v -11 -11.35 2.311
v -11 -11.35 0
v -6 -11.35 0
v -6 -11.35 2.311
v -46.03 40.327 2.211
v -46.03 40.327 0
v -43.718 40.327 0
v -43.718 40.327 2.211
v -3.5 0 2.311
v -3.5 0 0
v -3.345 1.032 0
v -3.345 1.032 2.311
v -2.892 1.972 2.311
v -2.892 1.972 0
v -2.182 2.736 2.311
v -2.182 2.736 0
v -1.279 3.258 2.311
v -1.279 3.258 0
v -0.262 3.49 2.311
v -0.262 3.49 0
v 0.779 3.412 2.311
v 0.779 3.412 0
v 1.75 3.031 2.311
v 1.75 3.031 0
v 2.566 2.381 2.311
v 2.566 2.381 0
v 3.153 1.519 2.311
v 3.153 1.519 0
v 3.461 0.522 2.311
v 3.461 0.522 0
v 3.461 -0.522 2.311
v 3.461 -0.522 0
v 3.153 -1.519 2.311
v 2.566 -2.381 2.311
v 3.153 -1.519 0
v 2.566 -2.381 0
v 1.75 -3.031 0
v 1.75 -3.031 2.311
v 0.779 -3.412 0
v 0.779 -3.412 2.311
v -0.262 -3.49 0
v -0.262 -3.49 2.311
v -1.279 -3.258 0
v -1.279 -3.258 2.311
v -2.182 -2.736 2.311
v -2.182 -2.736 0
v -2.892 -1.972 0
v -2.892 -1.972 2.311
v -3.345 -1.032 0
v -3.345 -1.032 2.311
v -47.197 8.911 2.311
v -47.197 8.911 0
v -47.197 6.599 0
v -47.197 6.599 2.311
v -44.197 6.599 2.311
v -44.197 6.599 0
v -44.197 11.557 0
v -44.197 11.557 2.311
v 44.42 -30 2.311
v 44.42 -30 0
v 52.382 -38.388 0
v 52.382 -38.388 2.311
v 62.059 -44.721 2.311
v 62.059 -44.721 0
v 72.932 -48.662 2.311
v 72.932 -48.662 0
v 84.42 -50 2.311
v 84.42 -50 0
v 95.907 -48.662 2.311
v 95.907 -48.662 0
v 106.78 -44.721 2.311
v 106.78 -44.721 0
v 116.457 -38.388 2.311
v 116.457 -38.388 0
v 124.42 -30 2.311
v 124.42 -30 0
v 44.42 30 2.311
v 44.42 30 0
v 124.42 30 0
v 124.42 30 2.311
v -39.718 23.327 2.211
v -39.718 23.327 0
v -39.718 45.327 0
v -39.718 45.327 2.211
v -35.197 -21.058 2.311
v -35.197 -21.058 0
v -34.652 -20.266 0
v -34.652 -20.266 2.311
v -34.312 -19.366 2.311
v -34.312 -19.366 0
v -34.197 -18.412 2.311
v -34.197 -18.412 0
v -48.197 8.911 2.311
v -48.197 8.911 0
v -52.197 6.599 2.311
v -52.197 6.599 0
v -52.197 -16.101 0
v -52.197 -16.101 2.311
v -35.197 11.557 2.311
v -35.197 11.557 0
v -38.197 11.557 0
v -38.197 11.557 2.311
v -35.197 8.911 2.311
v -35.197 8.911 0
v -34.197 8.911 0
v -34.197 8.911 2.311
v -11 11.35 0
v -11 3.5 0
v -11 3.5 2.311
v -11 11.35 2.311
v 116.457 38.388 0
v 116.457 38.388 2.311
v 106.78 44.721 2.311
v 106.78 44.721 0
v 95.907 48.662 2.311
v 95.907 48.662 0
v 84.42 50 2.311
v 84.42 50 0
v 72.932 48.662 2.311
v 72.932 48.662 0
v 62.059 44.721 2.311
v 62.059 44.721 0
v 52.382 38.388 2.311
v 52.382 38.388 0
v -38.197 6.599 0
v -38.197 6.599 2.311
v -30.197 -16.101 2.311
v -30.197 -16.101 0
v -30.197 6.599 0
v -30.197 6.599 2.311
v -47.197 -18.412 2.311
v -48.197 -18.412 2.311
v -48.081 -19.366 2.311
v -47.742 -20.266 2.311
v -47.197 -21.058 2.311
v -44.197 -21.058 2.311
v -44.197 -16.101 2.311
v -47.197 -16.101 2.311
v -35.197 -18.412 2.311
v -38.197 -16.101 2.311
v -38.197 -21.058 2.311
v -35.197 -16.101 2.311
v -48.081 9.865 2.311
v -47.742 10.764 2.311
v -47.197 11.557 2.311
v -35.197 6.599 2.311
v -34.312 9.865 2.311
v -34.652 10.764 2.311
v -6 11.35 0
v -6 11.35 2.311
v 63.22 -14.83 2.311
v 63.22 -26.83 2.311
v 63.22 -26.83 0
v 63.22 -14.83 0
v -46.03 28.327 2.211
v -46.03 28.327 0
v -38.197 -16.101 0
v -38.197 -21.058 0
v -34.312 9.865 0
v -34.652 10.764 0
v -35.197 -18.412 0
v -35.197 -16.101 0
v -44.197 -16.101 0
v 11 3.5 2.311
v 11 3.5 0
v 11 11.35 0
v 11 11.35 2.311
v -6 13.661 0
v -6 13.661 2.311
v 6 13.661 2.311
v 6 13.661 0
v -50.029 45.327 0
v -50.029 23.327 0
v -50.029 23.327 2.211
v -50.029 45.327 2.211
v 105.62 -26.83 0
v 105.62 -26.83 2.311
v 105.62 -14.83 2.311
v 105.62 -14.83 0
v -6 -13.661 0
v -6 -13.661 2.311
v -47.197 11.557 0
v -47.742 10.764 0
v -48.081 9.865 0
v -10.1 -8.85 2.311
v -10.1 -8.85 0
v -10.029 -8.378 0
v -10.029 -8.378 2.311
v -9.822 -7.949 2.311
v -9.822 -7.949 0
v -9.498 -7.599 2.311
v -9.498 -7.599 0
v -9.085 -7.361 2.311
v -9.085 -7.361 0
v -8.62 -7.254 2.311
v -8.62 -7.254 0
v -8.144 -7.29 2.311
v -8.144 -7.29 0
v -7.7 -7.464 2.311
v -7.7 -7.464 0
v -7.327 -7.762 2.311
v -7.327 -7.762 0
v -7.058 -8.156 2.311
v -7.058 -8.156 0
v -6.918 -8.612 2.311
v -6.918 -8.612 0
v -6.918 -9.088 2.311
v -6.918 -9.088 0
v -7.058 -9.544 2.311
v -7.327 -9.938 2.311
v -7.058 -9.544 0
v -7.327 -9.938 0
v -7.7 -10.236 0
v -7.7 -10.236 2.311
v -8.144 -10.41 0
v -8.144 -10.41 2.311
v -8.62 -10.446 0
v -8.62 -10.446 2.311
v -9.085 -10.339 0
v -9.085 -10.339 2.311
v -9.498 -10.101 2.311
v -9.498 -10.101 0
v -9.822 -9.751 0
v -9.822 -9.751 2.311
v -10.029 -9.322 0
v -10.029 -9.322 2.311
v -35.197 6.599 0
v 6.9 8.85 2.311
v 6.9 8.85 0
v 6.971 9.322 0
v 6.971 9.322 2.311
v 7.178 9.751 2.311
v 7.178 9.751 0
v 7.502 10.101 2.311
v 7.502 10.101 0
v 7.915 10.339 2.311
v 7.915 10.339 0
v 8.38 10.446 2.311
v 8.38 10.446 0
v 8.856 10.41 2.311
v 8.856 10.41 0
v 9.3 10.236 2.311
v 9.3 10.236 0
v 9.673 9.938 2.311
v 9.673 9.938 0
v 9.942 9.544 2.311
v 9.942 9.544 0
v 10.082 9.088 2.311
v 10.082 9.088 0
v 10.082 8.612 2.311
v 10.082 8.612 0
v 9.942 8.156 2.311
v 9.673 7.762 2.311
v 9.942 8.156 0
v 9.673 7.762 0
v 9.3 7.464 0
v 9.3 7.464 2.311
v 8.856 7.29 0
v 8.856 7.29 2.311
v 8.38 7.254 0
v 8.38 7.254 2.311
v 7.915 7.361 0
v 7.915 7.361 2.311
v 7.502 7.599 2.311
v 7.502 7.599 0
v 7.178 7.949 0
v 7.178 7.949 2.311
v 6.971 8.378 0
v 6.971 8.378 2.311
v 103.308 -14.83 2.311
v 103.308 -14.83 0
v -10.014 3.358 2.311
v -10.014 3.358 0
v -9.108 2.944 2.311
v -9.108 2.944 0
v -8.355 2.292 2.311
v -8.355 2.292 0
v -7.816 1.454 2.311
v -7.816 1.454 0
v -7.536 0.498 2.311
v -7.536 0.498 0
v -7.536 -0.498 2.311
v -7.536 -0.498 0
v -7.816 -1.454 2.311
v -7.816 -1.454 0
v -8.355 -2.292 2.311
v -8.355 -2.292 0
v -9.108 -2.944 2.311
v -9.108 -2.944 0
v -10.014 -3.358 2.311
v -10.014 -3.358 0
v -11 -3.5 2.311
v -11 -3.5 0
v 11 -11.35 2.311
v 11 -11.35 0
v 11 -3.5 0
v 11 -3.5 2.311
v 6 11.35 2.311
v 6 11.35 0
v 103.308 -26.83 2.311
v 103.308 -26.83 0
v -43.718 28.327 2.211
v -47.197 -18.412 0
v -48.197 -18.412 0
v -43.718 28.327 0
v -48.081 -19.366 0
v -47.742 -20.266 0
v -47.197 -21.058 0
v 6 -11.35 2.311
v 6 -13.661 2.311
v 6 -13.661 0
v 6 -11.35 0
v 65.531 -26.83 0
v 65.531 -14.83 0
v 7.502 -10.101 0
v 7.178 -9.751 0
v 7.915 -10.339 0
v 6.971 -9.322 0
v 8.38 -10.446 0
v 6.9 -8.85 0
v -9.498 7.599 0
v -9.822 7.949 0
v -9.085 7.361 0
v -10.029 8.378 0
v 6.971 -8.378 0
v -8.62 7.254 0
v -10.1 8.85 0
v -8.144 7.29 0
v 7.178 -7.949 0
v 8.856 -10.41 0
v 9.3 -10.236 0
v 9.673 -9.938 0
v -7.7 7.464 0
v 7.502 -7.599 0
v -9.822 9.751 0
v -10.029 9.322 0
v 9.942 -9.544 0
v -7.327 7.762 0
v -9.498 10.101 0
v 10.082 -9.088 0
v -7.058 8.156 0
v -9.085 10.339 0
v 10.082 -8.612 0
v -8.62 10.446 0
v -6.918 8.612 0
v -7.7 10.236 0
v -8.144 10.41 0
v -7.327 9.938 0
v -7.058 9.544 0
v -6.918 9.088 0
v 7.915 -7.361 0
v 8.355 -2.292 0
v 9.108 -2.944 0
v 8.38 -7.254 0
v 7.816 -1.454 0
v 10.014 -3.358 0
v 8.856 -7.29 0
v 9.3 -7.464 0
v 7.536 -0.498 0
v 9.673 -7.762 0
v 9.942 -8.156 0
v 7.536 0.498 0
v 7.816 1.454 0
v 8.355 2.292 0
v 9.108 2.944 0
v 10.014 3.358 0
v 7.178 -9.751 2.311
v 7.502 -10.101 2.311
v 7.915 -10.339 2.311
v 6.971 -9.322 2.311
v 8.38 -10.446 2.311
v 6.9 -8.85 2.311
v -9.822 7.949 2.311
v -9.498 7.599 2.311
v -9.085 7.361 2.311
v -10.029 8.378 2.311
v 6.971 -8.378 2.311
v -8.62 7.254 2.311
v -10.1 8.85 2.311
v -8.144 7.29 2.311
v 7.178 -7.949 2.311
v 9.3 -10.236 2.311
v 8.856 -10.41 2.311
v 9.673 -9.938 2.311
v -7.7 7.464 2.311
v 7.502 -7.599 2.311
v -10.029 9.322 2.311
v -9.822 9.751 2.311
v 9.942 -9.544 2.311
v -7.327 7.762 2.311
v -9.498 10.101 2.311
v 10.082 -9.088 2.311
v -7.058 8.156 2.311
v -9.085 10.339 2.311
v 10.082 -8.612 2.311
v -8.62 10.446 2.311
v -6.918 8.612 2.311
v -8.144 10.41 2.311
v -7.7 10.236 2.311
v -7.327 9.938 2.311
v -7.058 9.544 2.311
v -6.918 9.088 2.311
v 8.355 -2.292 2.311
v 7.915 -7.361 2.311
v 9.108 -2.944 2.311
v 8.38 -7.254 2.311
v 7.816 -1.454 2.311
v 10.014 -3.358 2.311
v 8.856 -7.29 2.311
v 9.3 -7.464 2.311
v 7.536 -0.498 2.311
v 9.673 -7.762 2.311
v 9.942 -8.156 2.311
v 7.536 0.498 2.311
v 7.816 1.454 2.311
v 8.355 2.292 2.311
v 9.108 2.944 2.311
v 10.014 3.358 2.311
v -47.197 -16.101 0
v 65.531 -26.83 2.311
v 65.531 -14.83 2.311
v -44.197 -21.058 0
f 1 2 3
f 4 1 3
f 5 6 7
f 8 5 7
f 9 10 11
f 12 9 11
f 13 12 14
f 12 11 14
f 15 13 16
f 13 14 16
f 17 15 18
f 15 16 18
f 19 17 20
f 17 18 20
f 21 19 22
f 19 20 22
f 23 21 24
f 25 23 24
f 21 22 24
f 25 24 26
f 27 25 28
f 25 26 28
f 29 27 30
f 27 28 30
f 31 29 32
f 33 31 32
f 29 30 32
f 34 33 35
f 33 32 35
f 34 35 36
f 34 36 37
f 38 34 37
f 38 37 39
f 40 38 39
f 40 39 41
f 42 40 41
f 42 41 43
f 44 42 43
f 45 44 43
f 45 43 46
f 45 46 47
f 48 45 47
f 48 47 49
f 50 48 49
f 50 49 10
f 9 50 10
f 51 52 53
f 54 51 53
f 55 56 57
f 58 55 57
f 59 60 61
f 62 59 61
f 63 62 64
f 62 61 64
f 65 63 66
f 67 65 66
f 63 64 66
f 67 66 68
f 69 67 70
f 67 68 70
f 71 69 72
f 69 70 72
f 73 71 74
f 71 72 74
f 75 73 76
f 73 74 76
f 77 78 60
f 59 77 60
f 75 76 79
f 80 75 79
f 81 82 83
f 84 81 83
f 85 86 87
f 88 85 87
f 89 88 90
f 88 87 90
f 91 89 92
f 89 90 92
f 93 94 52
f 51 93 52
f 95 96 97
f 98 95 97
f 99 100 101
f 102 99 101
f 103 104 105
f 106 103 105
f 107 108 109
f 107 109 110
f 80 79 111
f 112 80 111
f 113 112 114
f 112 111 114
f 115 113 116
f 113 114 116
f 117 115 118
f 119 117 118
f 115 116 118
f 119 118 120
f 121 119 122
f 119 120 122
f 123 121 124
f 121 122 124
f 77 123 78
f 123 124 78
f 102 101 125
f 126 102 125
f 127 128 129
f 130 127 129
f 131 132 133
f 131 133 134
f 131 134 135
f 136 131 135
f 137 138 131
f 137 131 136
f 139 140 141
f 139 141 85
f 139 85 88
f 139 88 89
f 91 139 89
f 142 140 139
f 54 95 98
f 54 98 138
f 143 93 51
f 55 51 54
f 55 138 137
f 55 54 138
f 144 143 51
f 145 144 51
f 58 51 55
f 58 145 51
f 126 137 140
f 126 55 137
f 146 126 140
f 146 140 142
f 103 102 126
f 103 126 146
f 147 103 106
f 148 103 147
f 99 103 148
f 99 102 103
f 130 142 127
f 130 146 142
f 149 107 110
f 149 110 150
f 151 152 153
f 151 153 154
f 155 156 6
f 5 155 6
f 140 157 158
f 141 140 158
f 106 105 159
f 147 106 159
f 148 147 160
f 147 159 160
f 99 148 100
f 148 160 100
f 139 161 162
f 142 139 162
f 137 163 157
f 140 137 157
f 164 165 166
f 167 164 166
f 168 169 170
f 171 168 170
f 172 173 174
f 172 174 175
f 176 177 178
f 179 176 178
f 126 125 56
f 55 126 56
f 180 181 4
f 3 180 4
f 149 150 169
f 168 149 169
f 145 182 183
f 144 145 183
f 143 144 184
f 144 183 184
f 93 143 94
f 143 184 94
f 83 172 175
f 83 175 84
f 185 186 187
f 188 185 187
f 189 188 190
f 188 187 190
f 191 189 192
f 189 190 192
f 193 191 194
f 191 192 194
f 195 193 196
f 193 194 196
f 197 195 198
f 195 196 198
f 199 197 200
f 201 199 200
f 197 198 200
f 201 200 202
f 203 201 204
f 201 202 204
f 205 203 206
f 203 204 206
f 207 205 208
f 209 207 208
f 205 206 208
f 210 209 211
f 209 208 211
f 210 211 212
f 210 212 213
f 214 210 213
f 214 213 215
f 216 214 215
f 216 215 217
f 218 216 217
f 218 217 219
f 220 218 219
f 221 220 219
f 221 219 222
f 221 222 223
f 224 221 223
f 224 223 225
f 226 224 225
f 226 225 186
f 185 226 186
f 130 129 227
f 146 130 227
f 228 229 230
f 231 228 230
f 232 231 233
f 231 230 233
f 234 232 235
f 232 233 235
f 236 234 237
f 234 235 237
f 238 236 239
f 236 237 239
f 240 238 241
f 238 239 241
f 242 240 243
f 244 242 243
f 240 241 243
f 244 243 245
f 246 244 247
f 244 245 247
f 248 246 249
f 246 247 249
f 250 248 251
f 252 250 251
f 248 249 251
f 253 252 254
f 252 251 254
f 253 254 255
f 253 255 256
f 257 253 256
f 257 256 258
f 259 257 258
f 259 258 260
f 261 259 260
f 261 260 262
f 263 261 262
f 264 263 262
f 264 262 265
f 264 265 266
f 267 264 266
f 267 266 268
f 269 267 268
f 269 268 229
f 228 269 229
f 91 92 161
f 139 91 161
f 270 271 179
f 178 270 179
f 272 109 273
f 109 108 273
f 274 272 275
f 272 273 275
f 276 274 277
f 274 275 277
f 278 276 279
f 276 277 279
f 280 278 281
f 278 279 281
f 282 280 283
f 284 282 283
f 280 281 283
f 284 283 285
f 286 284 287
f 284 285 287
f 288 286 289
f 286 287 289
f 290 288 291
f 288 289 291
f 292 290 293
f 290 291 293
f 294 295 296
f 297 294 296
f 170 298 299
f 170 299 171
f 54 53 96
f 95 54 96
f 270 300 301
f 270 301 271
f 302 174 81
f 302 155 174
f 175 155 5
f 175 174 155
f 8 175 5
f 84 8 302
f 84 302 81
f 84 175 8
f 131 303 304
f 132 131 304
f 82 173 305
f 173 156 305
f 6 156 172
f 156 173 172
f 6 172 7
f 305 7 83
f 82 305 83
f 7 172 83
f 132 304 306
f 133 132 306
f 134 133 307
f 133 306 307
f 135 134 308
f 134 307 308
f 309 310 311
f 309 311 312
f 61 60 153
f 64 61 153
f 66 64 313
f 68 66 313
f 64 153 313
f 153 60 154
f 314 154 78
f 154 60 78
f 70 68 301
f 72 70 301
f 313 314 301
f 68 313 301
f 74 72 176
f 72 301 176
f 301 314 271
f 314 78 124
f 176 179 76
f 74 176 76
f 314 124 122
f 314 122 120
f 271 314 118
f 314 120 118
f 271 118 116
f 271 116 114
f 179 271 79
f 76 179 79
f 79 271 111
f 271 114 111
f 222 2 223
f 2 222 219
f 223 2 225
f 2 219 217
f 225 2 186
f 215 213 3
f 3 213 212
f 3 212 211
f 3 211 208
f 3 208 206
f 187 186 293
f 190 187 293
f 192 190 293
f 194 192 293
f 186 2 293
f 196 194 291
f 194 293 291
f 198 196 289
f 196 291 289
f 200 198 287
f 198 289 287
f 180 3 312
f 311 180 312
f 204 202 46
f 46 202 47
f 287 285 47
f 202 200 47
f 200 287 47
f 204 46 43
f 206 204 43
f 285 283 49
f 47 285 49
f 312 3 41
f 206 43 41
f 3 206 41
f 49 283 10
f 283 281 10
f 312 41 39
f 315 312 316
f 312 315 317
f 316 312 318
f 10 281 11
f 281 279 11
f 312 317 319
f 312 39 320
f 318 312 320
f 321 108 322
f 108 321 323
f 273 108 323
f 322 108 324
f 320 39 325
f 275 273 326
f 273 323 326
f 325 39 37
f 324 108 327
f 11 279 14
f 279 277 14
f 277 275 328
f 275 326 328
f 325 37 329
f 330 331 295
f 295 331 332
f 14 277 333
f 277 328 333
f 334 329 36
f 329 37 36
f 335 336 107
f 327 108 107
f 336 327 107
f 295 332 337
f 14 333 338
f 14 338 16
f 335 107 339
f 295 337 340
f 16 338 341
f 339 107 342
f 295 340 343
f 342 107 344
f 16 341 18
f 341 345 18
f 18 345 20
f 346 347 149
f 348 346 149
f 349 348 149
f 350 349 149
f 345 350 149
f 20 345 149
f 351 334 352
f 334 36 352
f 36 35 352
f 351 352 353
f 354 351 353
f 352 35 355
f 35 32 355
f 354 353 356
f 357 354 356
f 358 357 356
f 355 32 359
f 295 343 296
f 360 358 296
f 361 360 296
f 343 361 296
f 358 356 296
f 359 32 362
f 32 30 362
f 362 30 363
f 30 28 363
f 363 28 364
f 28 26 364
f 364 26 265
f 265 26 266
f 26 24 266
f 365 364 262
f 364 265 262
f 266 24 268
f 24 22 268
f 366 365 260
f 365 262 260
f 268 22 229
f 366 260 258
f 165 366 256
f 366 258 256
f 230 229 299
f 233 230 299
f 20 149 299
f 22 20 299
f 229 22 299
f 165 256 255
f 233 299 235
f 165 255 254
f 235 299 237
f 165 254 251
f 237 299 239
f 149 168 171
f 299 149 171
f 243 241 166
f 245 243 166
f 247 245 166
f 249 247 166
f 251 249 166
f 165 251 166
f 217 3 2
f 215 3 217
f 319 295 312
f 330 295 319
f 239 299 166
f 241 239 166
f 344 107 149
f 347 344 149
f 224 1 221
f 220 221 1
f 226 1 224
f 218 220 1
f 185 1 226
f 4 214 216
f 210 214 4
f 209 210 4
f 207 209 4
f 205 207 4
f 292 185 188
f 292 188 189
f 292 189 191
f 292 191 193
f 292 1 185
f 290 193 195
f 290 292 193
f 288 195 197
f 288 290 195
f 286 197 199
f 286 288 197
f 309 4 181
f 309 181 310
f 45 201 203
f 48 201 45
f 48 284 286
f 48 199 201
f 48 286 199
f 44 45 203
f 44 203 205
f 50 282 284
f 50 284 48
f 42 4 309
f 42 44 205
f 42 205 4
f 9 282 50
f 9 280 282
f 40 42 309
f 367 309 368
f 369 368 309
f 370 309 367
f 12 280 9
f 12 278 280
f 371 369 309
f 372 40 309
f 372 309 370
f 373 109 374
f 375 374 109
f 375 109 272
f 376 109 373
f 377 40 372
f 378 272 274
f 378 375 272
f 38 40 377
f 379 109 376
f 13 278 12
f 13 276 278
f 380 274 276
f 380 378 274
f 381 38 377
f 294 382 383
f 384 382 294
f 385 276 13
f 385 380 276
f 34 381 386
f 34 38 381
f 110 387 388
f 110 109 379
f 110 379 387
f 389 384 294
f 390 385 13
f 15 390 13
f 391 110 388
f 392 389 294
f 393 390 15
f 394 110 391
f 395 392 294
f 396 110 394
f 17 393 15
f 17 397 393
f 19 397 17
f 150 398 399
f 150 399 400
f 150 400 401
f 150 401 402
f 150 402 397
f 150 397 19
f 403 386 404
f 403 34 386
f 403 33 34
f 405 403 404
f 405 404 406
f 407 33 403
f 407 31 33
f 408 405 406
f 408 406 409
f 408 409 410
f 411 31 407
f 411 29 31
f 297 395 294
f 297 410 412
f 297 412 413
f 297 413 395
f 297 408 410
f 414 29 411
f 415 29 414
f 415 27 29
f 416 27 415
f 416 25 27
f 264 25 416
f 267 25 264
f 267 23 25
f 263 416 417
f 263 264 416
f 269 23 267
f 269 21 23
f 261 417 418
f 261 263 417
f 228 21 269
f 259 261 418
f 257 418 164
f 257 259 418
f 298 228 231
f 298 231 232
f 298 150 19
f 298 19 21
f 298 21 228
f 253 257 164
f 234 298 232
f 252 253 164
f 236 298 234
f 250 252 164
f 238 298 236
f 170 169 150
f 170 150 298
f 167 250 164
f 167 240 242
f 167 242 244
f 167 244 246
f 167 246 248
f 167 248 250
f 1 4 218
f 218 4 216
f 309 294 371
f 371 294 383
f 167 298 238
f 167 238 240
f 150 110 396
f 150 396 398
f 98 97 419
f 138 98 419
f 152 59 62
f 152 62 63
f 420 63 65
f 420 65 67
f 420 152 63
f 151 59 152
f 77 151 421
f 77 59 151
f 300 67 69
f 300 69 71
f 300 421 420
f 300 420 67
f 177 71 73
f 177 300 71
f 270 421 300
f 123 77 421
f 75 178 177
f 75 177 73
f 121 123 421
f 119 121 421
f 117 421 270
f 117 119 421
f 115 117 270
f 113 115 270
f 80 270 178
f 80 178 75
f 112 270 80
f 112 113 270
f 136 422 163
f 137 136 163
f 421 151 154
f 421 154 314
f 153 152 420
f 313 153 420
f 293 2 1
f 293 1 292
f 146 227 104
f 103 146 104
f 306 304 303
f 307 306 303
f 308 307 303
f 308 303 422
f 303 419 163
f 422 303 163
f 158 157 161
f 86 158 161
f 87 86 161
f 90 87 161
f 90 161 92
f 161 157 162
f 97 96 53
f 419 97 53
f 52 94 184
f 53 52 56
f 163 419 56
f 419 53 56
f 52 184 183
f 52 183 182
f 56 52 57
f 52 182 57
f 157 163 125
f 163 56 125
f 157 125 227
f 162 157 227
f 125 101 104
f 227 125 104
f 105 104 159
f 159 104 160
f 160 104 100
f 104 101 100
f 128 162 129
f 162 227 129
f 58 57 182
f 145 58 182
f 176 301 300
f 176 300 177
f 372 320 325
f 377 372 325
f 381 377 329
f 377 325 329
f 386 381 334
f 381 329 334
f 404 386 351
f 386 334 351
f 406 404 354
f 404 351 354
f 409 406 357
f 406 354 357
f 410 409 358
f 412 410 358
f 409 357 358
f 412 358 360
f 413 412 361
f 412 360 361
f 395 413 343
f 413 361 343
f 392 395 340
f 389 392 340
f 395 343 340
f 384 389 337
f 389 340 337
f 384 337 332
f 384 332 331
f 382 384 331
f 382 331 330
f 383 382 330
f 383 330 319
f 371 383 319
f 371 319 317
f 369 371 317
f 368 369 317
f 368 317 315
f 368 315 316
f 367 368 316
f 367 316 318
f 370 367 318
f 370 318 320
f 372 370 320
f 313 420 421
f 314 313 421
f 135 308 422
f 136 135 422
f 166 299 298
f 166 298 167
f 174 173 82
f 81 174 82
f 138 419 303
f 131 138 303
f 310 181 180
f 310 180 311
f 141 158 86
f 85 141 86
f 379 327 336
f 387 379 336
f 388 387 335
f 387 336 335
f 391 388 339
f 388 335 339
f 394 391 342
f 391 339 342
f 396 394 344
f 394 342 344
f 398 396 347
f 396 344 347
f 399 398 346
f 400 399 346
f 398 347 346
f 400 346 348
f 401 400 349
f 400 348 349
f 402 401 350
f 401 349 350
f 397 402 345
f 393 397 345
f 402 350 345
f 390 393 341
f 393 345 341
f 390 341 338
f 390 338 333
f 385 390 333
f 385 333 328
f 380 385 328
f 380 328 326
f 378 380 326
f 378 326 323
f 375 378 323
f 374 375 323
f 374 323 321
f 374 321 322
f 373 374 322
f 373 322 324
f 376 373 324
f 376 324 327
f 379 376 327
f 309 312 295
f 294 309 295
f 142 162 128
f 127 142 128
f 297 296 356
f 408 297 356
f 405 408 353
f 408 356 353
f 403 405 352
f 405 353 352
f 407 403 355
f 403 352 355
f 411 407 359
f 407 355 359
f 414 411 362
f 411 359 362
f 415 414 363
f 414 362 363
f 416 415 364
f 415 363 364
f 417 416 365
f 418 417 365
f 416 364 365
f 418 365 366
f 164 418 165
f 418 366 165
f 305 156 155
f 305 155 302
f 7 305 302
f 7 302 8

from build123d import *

# Parameters (mm, degrees)
F0_W      = 22
F0_H      = 22.7
F1_DEPTH  = 2.3114
F3_D      = 3.2
F4_W      = 12
F4_H      = 2.3114
F5_DEPTH  = 2.3114
F8_D      = 7
F10_DEPTH = 2.3114
F11_W     = 2.3114
F11_H     = 12
F12_DEPTH = 2.3124
F13_W     = 5
F13_H     = 11.35
F13_W_2   = 3
F14_DEPTH = 2.3114
F15_W     = 10.311
F15_H     = 22
F15_W_2   = 2.3114
F15_H_2   = 12
F16_DEPTH = 2.211


# Not quite as in the source:
# - a feature names something its author has since deleted; it is built from what else it names


with BuildPart() as f1:
    # F0 (on Top) → F1 (new body)
    with BuildSketch(Plane.XY):
        Rectangle(F0_W, F0_H)
    extrude(amount=F1_DEPTH)

    # F3 (through all)
    with Locations(Plane.XY.offset(2.3114)):
        with Locations((-8.5, 8.85), (8.5, 8.85), (8.5, -8.85), (-8.5, -8.85)):
            Hole(F3_D / 2)


with BuildPart() as f5:
    # F4 (on face) → F5 (new body)
    with BuildSketch(Plane.XY.offset(2.3114)):
        with Locations((0, 12.5057)):
            Rectangle(F4_W, F4_H)
    extrude(amount=-F5_DEPTH)


with BuildPart() as f5b:
    # F4 (on face) → F5, piece 2 (new body)
    with BuildSketch(Plane.XY.offset(2.3114)):
        with Locations((0, -12.5057)):
            Rectangle(F4_W, F4_H)
    extrude(amount=-F5_DEPTH)


with BuildPart() as f1_1:
    add(f1.part)

    # F6: union F5, F5b
    add(f5.part)
    add(f5b.part)

    # F8 (through all)
    with Locations(Plane.XY.offset(2.3114)):
        with Locations((-11, 0), (11, 0), (0, 0)):
            Hole(F8_D / 2)


with BuildPart() as f10:
    # F9 (on Top) → F10 (new body)
    with BuildSketch(Plane.XY):
        with BuildLine():
            Line((124.4197436075, -30), (124.4197436075, 30))
            ThreePointArc((124.4197436075, 30), (106.7804233825, 44.72135955), (84.4197436075, 50))
            ThreePointArc((84.4197436075, 50), (62.0590638325, 44.72135955), (44.4197436075, 30))
            Line((44.4197436075, 30), (44.4197436075, -30))
            ThreePointArc((44.4197436075, -30), (62.0590638325, -44.72135955), (84.4197436075, -50))
            ThreePointArc((84.4197436075, -50), (106.7804233825, -44.72135955), (124.4197436075, -30))
        make_face()
    extrude(amount=F10_DEPTH)

    # F11 (on face) → F12 (cut, through all)
    with BuildSketch(Plane.XY.offset(2.3114)):
        with Locations((64.3754436075, -20.8296453593)):
            Rectangle(F11_W, F11_H)
        with Locations((104.4640436075, -20.8296453593)):
            Rectangle(F11_W, F11_H)
    extrude(amount=-F12_DEPTH, mode=Mode.SUBTRACT)


with BuildPart() as f14:
    # F13 (on Top) → F14 (new body)
    with BuildSketch(Plane.XY):
        with Locations((-49.6969209611, 0.9244190347)):
            Rectangle(F13_W, F13_H)
        with Locations((-45.6969209611, 0.9244190347)):
            Rectangle(F13_W_2, F13_H)
        with Locations((-39.6969209611, 0.9244190347)):
            Rectangle(F13_W_2, F13_H)
        with Locations((-39.6969209611, -10.4255809653)):
            Rectangle(F13_W_2, F13_H)
        with Locations((-49.6969209611, -10.4255809653)):
            Rectangle(F13_W, F13_H)
        with Locations((-32.6969209611, -10.4255809653)):
            Rectangle(F13_W, F13_H)
        with Locations((-32.6969209611, 0.9244190347)):
            Rectangle(F13_W, F13_H)
        with BuildLine():
            Line((-35.1969209611, -16.1005809653), (-38.1969209611, -16.1005809653))
            Line((-38.1969209611, -16.1005809653), (-38.1969209611, -18.4119809653))
            Line((-38.1969209611, -18.4119809653), (-38.1969209611, -21.0577322764))
            Line((-38.1969209611, -21.0577322764), (-35.1969209611, -21.0577322764))
            ThreePointArc((-35.1969209611, -21.0577322764), (-34.4552635744, -19.8261945277), (-34.1969209611, -18.4119809653))
            Line((-34.1969209611, -18.4119809653), (-35.1969209611, -18.4119809653))
            Line((-35.1969209611, -18.4119809653), (-35.1969209611, -16.1005809653))
        make_face()
        with Locations((-45.6969209611, -10.4255809653)):
            Rectangle(F13_W_2, F13_H)
        with Locations((-36.6969209611, 0.9244190347)):
            Rectangle(F13_W_2, F13_H)
        with Locations((-42.6969209611, 0.9244190347)):
            Rectangle(F13_W_2, F13_H)
        with Locations((-42.6969209611, -10.4255809653)):
            Rectangle(F13_W_2, F13_H)
        with Locations((-36.6969209611, -10.4255809653)):
            Rectangle(F13_W_2, F13_H)
        with BuildLine():
            Line((-47.1969209611, 8.9108190347), (-47.1969209611, 6.5994190347))
            Line((-47.1969209611, 6.5994190347), (-44.1969209611, 6.5994190347))
            Line((-44.1969209611, 6.5994190347), (-44.1969209611, 8.9108190347))
            Line((-44.1969209611, 8.9108190347), (-44.1969209611, 11.5565703458))
            Line((-44.1969209611, 11.5565703458), (-47.1969209611, 11.5565703458))
            ThreePointArc((-47.1969209611, 11.5565703458), (-47.9385783479, 10.3250325971), (-48.1969209611, 8.9108190347))
            Line((-48.1969209611, 8.9108190347), (-47.1969209611, 8.9108190347))
        make_face()
        with BuildLine():
            Line((-38.1969209611, 8.9108190347), (-38.1969209611, 6.5994190347))
            Line((-38.1969209611, 6.5994190347), (-35.1969209611, 6.5994190347))
            Line((-35.1969209611, 6.5994190347), (-35.1969209611, 8.9108190347))
            Line((-35.1969209611, 8.9108190347), (-34.1969209611, 8.9108190347))
            ThreePointArc((-34.1969209611, 8.9108190347), (-34.4552635744, 10.3250325971), (-35.1969209611, 11.5565703458))
            Line((-35.1969209611, 11.5565703458), (-38.1969209611, 11.5565703458))
            Line((-38.1969209611, 11.5565703458), (-38.1969209611, 8.9108190347))
        make_face()
        with BuildLine():
            Line((-44.1969209611, -16.1005809653), (-47.1969209611, -16.1005809653))
            Line((-47.1969209611, -16.1005809653), (-47.1969209611, -18.4119809653))
            Line((-47.1969209611, -18.4119809653), (-48.1969209611, -18.4119809653))
            ThreePointArc((-48.1969209611, -18.4119809653), (-47.9385783479, -19.8261945277), (-47.1969209611, -21.0577322764))
            Line((-47.1969209611, -21.0577322764), (-44.1969209611, -21.0577322764))
            Line((-44.1969209611, -21.0577322764), (-44.1969209611, -18.4119809653))
            Line((-44.1969209611, -18.4119809653), (-44.1969209611, -16.1005809653))
        make_face()
    extrude(amount=F14_DEPTH)


with BuildPart() as f16:
    # F15 (on Top) → F16 (new body)
    with BuildSketch(Plane.XY):
        with Locations((-44.8737465275, 34.3274882433)):
            Rectangle(F15_W, F15_H)
        with Locations((-44.8739465275, 34.3274882433)):
            Rectangle(F15_W_2, F15_H_2, mode=Mode.SUBTRACT)
    extrude(amount=F16_DEPTH)


solid = Compound([f1_1.part, f10.part, f14.part, f16.part])
